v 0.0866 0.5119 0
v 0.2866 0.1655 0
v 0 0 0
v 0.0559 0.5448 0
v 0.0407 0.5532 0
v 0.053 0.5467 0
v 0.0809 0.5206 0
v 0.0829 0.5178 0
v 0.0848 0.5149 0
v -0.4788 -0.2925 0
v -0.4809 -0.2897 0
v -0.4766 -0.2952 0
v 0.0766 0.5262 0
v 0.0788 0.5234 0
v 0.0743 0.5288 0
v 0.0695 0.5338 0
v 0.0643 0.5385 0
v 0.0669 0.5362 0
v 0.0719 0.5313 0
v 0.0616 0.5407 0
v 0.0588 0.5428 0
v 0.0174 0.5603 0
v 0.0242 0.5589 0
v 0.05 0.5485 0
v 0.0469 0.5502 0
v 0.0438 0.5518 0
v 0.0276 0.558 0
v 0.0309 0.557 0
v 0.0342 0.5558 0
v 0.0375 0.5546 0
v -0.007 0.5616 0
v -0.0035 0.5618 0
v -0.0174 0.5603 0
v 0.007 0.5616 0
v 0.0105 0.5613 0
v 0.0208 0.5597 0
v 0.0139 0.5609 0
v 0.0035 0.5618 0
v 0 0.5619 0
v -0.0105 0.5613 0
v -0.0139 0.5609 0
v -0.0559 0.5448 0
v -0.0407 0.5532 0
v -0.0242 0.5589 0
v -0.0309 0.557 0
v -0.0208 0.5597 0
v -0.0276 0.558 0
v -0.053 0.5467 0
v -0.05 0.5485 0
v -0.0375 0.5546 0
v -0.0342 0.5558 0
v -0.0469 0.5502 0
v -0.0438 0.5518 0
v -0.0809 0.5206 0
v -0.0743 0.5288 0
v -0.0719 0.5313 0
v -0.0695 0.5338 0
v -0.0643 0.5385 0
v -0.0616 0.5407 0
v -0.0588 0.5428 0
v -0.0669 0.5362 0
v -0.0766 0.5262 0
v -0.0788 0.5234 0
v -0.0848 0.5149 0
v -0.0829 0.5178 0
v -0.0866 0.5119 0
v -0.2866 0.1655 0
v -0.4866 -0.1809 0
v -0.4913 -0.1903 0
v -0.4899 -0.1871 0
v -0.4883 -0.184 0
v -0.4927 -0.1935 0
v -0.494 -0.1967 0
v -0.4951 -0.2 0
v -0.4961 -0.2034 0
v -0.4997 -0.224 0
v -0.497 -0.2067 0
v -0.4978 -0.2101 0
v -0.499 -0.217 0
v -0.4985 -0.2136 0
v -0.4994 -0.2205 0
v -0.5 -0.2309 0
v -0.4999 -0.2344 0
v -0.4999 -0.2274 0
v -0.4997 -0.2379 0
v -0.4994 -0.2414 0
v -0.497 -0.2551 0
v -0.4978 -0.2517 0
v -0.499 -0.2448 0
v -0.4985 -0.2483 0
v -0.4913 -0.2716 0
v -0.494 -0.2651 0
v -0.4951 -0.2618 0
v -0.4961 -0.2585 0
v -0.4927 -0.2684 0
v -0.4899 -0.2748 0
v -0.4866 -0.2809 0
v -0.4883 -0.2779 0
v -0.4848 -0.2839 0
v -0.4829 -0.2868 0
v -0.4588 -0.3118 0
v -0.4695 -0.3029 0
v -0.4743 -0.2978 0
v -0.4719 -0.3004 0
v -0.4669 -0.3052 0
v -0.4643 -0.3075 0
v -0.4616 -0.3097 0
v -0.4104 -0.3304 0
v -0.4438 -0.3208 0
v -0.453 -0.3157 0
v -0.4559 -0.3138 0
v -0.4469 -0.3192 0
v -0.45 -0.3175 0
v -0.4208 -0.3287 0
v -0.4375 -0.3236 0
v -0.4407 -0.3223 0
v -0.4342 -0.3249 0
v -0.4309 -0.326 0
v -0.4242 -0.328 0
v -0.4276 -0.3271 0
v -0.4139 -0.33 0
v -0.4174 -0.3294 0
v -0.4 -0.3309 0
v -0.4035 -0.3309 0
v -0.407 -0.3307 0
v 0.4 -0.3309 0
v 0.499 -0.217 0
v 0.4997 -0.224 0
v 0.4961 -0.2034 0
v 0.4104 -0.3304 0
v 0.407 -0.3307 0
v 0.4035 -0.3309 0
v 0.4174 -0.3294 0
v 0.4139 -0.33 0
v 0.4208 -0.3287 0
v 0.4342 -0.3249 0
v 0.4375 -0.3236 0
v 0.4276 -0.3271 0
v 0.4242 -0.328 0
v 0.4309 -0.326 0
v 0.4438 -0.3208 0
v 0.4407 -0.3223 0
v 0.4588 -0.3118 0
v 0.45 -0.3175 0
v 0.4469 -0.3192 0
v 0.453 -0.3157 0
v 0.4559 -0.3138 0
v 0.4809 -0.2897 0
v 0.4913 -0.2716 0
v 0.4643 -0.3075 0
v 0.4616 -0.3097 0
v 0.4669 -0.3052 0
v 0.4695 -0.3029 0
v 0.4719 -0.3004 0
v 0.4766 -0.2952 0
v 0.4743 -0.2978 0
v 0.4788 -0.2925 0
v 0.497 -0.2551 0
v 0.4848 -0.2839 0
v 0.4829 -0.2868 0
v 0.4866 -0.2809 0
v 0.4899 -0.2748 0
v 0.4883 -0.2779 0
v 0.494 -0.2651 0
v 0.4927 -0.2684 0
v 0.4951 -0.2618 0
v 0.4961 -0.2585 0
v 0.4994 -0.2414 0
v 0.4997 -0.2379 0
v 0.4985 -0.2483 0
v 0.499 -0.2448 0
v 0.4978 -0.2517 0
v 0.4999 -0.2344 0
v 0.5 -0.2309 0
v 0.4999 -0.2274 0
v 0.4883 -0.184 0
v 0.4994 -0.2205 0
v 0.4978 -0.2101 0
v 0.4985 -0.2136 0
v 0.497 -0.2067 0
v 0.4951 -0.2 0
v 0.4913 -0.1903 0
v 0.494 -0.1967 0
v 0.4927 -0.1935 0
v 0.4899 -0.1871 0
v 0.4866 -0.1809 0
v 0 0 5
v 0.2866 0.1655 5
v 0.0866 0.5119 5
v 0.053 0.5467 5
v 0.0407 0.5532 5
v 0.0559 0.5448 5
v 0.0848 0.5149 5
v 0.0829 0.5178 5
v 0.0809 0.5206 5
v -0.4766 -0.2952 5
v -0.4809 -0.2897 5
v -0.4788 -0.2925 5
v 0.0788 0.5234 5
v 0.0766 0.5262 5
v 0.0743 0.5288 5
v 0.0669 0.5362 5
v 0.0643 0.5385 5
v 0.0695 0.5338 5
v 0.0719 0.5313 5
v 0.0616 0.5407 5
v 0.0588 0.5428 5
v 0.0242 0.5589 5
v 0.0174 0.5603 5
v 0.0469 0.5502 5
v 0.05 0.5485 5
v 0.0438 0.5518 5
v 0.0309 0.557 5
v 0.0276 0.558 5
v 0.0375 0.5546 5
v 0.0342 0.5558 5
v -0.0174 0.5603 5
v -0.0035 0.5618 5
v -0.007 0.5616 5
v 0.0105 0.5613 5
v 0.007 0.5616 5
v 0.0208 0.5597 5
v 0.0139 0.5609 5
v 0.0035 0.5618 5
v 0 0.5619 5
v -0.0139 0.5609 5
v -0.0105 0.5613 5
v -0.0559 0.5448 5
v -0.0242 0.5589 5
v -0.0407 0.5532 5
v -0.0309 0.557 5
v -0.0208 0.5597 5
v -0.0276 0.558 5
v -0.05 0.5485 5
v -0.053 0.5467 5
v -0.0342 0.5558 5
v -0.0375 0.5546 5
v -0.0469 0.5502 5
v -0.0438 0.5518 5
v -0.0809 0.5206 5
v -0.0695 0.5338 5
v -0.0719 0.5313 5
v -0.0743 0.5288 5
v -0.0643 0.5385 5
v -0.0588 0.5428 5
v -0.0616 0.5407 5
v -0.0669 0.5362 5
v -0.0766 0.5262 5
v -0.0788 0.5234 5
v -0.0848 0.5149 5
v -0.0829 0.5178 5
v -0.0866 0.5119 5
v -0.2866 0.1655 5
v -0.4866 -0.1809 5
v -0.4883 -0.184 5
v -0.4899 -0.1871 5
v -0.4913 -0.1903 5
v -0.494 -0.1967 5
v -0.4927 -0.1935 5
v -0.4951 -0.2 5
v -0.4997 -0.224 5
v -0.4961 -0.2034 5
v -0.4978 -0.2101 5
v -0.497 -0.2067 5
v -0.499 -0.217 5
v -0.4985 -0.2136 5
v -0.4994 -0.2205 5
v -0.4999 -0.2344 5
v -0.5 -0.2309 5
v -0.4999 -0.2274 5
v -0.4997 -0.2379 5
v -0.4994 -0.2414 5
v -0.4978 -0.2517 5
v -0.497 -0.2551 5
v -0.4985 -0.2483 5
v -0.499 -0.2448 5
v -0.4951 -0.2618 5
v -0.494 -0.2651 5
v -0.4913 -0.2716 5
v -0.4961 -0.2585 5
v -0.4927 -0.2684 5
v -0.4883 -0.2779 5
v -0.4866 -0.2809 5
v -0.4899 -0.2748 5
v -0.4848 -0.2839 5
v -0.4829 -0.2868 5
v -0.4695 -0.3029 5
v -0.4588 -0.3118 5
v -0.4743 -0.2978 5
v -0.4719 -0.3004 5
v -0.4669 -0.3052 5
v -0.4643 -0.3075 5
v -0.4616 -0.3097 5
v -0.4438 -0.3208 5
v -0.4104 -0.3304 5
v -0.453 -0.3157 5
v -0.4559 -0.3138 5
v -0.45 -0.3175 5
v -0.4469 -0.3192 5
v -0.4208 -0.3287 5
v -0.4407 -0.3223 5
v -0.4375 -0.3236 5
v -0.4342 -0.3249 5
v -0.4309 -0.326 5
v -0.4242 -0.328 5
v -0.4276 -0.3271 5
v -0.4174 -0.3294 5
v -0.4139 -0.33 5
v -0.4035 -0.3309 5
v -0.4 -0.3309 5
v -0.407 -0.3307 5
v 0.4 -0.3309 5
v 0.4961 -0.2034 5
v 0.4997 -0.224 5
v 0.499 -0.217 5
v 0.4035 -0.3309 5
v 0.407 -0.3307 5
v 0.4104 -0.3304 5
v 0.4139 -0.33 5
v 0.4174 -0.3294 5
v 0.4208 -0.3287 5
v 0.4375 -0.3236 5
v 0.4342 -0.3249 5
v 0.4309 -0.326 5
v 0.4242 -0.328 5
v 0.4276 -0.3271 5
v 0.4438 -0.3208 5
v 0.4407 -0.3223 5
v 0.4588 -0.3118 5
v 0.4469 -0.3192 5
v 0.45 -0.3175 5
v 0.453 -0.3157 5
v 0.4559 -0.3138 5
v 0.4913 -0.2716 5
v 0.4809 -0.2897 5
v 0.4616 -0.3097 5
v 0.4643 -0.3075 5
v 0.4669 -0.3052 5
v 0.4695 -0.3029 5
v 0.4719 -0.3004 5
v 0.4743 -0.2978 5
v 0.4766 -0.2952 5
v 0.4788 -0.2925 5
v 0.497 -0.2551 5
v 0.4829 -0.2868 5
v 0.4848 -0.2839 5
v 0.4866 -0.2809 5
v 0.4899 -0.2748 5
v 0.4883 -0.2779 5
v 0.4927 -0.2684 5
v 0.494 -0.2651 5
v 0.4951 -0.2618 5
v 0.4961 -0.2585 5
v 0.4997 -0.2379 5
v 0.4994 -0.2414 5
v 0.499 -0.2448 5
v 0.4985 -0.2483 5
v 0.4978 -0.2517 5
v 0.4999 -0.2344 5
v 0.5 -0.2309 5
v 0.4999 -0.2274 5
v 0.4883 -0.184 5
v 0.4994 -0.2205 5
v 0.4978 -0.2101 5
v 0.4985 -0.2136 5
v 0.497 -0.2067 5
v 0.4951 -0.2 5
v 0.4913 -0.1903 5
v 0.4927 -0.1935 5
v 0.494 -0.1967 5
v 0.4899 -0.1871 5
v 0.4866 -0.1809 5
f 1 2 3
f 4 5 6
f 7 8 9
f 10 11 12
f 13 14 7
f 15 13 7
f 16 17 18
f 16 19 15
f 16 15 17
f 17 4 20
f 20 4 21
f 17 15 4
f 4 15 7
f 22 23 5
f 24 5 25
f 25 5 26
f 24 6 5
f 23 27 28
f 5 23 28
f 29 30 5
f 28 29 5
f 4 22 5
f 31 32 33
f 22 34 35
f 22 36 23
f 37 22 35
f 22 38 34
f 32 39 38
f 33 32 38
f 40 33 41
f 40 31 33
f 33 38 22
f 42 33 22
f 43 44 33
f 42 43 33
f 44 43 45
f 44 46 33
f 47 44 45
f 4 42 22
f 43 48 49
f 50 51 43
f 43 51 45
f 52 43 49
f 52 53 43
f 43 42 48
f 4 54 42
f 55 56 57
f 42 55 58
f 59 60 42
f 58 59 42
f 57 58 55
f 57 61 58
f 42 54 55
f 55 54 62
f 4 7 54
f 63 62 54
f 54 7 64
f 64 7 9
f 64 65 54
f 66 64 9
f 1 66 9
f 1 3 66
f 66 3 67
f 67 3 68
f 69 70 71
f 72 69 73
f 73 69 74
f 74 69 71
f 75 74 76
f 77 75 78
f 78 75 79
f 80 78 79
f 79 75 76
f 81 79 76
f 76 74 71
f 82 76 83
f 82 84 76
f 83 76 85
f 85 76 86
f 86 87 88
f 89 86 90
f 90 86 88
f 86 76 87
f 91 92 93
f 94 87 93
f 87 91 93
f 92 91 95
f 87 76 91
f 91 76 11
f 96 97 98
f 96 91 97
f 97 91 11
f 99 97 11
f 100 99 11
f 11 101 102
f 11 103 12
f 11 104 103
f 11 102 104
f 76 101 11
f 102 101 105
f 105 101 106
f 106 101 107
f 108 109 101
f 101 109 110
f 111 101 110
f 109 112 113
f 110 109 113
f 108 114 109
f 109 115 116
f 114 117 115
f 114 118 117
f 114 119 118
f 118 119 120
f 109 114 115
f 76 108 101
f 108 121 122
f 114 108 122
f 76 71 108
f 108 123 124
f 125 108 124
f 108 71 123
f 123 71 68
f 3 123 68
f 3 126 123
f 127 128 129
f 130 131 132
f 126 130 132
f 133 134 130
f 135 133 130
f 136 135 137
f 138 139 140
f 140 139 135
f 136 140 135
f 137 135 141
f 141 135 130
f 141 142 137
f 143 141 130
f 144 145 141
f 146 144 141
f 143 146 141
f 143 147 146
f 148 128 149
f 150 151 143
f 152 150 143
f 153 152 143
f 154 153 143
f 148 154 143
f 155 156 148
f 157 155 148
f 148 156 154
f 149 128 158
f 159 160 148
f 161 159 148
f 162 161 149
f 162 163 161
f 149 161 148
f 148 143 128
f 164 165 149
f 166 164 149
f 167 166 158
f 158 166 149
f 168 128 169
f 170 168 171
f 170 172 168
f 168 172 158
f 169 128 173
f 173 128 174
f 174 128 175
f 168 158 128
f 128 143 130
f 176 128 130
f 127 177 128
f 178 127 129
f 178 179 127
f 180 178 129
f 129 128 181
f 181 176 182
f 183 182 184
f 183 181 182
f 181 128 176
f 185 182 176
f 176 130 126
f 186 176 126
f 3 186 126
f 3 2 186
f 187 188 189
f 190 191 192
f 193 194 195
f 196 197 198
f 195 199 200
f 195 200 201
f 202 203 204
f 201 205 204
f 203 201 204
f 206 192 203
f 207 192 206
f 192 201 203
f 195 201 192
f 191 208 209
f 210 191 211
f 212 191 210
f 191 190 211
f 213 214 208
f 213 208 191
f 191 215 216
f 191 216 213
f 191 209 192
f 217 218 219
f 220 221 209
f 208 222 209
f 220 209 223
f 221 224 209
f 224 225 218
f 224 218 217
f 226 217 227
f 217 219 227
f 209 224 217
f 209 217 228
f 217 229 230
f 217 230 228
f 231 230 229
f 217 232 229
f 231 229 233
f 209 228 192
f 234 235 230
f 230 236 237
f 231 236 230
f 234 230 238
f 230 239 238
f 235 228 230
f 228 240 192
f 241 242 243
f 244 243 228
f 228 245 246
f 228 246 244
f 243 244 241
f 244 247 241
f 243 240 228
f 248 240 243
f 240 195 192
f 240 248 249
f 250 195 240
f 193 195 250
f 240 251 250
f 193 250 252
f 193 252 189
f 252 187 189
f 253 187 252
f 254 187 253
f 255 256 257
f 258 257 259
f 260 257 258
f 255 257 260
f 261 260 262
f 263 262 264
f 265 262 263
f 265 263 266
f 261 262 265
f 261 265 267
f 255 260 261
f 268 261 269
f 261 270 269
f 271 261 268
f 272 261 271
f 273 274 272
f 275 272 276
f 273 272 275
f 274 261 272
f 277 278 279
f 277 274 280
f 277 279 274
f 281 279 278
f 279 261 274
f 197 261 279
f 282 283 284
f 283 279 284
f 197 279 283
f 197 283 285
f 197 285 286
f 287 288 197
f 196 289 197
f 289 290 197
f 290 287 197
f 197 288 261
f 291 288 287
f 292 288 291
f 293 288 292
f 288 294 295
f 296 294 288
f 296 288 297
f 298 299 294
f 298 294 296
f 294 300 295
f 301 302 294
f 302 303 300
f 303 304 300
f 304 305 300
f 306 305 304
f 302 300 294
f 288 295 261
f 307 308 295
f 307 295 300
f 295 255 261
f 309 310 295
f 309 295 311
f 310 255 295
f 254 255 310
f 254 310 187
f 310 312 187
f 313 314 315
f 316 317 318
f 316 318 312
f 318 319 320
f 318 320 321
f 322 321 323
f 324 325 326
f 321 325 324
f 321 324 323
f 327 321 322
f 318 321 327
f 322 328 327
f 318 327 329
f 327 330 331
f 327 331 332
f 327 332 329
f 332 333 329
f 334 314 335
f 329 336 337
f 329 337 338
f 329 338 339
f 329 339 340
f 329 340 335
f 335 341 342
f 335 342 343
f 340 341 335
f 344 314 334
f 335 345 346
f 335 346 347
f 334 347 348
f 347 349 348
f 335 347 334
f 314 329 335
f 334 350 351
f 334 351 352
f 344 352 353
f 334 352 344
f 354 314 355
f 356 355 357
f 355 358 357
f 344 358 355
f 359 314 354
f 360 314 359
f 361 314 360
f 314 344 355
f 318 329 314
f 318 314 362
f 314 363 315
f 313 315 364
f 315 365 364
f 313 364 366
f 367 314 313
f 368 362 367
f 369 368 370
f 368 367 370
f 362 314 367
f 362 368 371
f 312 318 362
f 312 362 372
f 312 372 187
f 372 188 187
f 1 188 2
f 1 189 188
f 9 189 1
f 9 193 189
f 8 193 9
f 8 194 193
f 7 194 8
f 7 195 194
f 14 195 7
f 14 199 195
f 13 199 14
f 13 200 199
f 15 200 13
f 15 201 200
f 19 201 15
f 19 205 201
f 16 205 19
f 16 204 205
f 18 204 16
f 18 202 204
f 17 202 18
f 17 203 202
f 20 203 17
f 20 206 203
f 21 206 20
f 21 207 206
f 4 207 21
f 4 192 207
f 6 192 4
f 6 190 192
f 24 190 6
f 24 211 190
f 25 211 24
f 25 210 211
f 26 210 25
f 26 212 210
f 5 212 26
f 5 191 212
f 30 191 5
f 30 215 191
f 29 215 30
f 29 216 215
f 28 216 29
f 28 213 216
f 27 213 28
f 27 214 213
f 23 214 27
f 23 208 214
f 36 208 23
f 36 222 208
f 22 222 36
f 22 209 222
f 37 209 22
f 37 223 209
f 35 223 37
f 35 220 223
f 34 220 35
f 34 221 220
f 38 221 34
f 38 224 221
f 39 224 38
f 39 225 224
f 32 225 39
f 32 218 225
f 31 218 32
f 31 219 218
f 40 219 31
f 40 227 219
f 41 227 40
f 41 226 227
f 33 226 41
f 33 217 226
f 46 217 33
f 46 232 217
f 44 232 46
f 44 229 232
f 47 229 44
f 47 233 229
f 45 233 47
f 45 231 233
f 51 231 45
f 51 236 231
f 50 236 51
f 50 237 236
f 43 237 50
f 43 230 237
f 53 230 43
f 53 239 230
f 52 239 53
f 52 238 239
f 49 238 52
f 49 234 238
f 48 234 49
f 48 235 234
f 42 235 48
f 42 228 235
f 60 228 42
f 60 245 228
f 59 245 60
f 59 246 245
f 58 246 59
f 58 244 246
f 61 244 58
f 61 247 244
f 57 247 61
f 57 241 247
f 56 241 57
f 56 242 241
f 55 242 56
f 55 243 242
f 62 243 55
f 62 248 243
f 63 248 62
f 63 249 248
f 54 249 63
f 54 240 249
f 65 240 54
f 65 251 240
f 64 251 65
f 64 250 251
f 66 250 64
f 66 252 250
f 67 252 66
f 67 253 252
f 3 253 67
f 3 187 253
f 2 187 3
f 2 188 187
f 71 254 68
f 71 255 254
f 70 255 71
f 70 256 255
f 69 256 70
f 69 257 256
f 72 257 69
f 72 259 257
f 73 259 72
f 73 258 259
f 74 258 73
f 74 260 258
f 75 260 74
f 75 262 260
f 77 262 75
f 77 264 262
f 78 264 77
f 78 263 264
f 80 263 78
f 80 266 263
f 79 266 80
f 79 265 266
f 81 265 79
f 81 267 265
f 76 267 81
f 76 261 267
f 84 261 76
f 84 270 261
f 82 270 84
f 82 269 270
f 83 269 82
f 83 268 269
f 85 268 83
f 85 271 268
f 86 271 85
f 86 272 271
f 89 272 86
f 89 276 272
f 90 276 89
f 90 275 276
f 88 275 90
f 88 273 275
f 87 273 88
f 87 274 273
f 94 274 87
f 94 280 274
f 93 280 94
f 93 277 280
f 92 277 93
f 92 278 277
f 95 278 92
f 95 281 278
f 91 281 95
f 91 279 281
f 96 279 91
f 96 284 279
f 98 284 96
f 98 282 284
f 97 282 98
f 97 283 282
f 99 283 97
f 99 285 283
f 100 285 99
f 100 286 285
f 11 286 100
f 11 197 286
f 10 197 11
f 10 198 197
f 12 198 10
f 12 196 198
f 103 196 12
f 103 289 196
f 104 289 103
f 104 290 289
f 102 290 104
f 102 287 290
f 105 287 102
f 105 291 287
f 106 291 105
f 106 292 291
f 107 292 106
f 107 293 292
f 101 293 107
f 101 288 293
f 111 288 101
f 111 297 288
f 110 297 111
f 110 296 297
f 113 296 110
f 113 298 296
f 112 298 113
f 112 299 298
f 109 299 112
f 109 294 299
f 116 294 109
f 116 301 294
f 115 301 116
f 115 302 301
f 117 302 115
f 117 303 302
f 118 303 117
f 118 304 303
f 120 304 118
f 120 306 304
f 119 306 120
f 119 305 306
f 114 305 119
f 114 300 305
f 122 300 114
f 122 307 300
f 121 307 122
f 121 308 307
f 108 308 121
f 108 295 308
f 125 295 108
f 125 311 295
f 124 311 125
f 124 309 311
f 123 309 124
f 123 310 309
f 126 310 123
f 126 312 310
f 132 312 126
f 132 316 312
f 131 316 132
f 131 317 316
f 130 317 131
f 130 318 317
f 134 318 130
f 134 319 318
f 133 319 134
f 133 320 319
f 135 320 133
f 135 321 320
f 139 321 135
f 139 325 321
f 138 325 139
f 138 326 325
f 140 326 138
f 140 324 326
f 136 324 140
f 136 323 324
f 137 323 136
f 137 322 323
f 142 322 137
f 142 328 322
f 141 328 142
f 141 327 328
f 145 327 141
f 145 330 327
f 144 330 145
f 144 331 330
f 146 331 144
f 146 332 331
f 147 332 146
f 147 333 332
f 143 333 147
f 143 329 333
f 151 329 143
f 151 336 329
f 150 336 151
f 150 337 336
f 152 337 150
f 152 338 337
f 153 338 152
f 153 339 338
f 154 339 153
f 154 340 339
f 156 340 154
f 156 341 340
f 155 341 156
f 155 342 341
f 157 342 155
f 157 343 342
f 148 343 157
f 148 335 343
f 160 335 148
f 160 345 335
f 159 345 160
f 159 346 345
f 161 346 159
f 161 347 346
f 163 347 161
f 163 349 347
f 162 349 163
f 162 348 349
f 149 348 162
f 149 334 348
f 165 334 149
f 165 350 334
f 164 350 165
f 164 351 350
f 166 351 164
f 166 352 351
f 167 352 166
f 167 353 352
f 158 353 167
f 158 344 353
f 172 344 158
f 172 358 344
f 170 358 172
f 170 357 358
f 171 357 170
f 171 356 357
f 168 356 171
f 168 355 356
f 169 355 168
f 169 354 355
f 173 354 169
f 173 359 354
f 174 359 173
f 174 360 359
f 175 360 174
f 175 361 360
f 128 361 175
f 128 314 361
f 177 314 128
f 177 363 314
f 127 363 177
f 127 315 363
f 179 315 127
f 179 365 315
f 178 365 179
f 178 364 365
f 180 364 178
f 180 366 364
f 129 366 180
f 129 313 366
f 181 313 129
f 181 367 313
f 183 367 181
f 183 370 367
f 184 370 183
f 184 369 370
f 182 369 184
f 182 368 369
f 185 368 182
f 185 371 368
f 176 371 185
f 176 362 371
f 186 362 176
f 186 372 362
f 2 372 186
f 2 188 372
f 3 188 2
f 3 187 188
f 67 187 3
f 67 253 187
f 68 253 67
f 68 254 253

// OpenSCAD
// triangle base width including rounding
size = 1;
// radius of the edge rounding
rounding = .100;

// right side of the top third triangle section
module section(size, rounding) {
    //triangle side length w/o rounding
    side = (size - rounding*2) + rounding/tan(30) * 2;
    // triangle height w/o rounding
    height = sqrt(3)/2 * side;
    // triangle center
    ox = 0;
    oy = 0;
    // length of the line from the center to a side (perpendicular)
    oa = sqrt(3)/3 * side/2;
    // point on the middle of the right side
    ax = ox + cos(30) * oa;
    ay = oy + sin(30) * oa;
    // length from triangle center to a corner
    raw_height = side*sqrt(3)/3;
    rounding_center = raw_height - rounding * 2;
    echo("rounding_center", rounding_center);
    arc = [for (i=[30:2:90]) [
        cos(i)*rounding, 
        rounding_center + sin(i)*rounding
    ]];
    polygon(concat([[ox,oy],[ax,ay]], arc));
}
module third(size, rounding) {
    section(size, rounding);
    mirror([1,0,0])
    section(size, rounding);
}

module stick_profile(size, rounding) {
    for (i = [0,120,240]) {
        rotate([0,0,i])
        third(size, rounding);
    }
}

module stick(width, rounding, length) {
    linear_extrude(length)
    stick_profile(width, rounding);
}


stick(size, rounding, 5);
